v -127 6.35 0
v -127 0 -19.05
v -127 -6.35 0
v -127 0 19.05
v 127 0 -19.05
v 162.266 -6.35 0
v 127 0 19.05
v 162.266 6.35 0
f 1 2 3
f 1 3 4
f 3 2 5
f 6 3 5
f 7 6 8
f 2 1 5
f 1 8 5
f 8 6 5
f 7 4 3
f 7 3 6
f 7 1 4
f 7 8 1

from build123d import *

# Parameters (mm, degrees)
F0_W     = 127
F0_H     = 19.05
F1_DEPTH = 6.35
F3_DEPTH = 298.45
F4_W     = 12.7
F4_H     = 19.05
F5_DEPTH = 324.104


with BuildPart() as f1:
    # F0 (on Front) → F1 (new body, symmetric)
    with BuildSketch(Plane.XZ):
        Polygon((0, 19.05), (-127, 19.05), (-127, -19.05), (0, -19.05), (0, 0), align=None)
        with Locations((63.5, 9.525)):
            Rectangle(F0_W, F0_H)
        Polygon((162.265509367, 0), (127, 19.05), (127, 0), align=None)
        with Locations((63.5, -9.525)):
            Rectangle(F0_W, F0_H)
        Polygon((162.265509367, 0), (127, 0), (127, -19.05), align=None)
    extrude(amount=F1_DEPTH, both=True)

    # F2 (on face) → F3 (cut)
    with BuildSketch(Plane(origin=(-127, 0, 0), x_dir=(0, -1, 0), z_dir=(-1, 0, 0))):
        Polygon((-6.35, 0), (0, 19.05), (-6.35, 19.05), align=None)
        Polygon((0, 19.05), (6.35, 0), (6.35, 19.05), align=None)
    extrude(amount=-F3_DEPTH, mode=Mode.SUBTRACT)

    # F4 (on face) → F5 (cut)
    with BuildSketch(Plane(origin=(-127, 0, 0), x_dir=(0, -1, 0), z_dir=(-1, 0, 0))):
        with Locations((0, -9.525)):
            Rectangle(F4_W, F4_H)
    extrude(amount=-F5_DEPTH, mode=Mode.SUBTRACT)

    # F6: F1 across plane


with BuildPart() as f1_1:
    add(f1.part)
    add(f1.part.mirror(Plane.XY))


solid = f1_1.part
